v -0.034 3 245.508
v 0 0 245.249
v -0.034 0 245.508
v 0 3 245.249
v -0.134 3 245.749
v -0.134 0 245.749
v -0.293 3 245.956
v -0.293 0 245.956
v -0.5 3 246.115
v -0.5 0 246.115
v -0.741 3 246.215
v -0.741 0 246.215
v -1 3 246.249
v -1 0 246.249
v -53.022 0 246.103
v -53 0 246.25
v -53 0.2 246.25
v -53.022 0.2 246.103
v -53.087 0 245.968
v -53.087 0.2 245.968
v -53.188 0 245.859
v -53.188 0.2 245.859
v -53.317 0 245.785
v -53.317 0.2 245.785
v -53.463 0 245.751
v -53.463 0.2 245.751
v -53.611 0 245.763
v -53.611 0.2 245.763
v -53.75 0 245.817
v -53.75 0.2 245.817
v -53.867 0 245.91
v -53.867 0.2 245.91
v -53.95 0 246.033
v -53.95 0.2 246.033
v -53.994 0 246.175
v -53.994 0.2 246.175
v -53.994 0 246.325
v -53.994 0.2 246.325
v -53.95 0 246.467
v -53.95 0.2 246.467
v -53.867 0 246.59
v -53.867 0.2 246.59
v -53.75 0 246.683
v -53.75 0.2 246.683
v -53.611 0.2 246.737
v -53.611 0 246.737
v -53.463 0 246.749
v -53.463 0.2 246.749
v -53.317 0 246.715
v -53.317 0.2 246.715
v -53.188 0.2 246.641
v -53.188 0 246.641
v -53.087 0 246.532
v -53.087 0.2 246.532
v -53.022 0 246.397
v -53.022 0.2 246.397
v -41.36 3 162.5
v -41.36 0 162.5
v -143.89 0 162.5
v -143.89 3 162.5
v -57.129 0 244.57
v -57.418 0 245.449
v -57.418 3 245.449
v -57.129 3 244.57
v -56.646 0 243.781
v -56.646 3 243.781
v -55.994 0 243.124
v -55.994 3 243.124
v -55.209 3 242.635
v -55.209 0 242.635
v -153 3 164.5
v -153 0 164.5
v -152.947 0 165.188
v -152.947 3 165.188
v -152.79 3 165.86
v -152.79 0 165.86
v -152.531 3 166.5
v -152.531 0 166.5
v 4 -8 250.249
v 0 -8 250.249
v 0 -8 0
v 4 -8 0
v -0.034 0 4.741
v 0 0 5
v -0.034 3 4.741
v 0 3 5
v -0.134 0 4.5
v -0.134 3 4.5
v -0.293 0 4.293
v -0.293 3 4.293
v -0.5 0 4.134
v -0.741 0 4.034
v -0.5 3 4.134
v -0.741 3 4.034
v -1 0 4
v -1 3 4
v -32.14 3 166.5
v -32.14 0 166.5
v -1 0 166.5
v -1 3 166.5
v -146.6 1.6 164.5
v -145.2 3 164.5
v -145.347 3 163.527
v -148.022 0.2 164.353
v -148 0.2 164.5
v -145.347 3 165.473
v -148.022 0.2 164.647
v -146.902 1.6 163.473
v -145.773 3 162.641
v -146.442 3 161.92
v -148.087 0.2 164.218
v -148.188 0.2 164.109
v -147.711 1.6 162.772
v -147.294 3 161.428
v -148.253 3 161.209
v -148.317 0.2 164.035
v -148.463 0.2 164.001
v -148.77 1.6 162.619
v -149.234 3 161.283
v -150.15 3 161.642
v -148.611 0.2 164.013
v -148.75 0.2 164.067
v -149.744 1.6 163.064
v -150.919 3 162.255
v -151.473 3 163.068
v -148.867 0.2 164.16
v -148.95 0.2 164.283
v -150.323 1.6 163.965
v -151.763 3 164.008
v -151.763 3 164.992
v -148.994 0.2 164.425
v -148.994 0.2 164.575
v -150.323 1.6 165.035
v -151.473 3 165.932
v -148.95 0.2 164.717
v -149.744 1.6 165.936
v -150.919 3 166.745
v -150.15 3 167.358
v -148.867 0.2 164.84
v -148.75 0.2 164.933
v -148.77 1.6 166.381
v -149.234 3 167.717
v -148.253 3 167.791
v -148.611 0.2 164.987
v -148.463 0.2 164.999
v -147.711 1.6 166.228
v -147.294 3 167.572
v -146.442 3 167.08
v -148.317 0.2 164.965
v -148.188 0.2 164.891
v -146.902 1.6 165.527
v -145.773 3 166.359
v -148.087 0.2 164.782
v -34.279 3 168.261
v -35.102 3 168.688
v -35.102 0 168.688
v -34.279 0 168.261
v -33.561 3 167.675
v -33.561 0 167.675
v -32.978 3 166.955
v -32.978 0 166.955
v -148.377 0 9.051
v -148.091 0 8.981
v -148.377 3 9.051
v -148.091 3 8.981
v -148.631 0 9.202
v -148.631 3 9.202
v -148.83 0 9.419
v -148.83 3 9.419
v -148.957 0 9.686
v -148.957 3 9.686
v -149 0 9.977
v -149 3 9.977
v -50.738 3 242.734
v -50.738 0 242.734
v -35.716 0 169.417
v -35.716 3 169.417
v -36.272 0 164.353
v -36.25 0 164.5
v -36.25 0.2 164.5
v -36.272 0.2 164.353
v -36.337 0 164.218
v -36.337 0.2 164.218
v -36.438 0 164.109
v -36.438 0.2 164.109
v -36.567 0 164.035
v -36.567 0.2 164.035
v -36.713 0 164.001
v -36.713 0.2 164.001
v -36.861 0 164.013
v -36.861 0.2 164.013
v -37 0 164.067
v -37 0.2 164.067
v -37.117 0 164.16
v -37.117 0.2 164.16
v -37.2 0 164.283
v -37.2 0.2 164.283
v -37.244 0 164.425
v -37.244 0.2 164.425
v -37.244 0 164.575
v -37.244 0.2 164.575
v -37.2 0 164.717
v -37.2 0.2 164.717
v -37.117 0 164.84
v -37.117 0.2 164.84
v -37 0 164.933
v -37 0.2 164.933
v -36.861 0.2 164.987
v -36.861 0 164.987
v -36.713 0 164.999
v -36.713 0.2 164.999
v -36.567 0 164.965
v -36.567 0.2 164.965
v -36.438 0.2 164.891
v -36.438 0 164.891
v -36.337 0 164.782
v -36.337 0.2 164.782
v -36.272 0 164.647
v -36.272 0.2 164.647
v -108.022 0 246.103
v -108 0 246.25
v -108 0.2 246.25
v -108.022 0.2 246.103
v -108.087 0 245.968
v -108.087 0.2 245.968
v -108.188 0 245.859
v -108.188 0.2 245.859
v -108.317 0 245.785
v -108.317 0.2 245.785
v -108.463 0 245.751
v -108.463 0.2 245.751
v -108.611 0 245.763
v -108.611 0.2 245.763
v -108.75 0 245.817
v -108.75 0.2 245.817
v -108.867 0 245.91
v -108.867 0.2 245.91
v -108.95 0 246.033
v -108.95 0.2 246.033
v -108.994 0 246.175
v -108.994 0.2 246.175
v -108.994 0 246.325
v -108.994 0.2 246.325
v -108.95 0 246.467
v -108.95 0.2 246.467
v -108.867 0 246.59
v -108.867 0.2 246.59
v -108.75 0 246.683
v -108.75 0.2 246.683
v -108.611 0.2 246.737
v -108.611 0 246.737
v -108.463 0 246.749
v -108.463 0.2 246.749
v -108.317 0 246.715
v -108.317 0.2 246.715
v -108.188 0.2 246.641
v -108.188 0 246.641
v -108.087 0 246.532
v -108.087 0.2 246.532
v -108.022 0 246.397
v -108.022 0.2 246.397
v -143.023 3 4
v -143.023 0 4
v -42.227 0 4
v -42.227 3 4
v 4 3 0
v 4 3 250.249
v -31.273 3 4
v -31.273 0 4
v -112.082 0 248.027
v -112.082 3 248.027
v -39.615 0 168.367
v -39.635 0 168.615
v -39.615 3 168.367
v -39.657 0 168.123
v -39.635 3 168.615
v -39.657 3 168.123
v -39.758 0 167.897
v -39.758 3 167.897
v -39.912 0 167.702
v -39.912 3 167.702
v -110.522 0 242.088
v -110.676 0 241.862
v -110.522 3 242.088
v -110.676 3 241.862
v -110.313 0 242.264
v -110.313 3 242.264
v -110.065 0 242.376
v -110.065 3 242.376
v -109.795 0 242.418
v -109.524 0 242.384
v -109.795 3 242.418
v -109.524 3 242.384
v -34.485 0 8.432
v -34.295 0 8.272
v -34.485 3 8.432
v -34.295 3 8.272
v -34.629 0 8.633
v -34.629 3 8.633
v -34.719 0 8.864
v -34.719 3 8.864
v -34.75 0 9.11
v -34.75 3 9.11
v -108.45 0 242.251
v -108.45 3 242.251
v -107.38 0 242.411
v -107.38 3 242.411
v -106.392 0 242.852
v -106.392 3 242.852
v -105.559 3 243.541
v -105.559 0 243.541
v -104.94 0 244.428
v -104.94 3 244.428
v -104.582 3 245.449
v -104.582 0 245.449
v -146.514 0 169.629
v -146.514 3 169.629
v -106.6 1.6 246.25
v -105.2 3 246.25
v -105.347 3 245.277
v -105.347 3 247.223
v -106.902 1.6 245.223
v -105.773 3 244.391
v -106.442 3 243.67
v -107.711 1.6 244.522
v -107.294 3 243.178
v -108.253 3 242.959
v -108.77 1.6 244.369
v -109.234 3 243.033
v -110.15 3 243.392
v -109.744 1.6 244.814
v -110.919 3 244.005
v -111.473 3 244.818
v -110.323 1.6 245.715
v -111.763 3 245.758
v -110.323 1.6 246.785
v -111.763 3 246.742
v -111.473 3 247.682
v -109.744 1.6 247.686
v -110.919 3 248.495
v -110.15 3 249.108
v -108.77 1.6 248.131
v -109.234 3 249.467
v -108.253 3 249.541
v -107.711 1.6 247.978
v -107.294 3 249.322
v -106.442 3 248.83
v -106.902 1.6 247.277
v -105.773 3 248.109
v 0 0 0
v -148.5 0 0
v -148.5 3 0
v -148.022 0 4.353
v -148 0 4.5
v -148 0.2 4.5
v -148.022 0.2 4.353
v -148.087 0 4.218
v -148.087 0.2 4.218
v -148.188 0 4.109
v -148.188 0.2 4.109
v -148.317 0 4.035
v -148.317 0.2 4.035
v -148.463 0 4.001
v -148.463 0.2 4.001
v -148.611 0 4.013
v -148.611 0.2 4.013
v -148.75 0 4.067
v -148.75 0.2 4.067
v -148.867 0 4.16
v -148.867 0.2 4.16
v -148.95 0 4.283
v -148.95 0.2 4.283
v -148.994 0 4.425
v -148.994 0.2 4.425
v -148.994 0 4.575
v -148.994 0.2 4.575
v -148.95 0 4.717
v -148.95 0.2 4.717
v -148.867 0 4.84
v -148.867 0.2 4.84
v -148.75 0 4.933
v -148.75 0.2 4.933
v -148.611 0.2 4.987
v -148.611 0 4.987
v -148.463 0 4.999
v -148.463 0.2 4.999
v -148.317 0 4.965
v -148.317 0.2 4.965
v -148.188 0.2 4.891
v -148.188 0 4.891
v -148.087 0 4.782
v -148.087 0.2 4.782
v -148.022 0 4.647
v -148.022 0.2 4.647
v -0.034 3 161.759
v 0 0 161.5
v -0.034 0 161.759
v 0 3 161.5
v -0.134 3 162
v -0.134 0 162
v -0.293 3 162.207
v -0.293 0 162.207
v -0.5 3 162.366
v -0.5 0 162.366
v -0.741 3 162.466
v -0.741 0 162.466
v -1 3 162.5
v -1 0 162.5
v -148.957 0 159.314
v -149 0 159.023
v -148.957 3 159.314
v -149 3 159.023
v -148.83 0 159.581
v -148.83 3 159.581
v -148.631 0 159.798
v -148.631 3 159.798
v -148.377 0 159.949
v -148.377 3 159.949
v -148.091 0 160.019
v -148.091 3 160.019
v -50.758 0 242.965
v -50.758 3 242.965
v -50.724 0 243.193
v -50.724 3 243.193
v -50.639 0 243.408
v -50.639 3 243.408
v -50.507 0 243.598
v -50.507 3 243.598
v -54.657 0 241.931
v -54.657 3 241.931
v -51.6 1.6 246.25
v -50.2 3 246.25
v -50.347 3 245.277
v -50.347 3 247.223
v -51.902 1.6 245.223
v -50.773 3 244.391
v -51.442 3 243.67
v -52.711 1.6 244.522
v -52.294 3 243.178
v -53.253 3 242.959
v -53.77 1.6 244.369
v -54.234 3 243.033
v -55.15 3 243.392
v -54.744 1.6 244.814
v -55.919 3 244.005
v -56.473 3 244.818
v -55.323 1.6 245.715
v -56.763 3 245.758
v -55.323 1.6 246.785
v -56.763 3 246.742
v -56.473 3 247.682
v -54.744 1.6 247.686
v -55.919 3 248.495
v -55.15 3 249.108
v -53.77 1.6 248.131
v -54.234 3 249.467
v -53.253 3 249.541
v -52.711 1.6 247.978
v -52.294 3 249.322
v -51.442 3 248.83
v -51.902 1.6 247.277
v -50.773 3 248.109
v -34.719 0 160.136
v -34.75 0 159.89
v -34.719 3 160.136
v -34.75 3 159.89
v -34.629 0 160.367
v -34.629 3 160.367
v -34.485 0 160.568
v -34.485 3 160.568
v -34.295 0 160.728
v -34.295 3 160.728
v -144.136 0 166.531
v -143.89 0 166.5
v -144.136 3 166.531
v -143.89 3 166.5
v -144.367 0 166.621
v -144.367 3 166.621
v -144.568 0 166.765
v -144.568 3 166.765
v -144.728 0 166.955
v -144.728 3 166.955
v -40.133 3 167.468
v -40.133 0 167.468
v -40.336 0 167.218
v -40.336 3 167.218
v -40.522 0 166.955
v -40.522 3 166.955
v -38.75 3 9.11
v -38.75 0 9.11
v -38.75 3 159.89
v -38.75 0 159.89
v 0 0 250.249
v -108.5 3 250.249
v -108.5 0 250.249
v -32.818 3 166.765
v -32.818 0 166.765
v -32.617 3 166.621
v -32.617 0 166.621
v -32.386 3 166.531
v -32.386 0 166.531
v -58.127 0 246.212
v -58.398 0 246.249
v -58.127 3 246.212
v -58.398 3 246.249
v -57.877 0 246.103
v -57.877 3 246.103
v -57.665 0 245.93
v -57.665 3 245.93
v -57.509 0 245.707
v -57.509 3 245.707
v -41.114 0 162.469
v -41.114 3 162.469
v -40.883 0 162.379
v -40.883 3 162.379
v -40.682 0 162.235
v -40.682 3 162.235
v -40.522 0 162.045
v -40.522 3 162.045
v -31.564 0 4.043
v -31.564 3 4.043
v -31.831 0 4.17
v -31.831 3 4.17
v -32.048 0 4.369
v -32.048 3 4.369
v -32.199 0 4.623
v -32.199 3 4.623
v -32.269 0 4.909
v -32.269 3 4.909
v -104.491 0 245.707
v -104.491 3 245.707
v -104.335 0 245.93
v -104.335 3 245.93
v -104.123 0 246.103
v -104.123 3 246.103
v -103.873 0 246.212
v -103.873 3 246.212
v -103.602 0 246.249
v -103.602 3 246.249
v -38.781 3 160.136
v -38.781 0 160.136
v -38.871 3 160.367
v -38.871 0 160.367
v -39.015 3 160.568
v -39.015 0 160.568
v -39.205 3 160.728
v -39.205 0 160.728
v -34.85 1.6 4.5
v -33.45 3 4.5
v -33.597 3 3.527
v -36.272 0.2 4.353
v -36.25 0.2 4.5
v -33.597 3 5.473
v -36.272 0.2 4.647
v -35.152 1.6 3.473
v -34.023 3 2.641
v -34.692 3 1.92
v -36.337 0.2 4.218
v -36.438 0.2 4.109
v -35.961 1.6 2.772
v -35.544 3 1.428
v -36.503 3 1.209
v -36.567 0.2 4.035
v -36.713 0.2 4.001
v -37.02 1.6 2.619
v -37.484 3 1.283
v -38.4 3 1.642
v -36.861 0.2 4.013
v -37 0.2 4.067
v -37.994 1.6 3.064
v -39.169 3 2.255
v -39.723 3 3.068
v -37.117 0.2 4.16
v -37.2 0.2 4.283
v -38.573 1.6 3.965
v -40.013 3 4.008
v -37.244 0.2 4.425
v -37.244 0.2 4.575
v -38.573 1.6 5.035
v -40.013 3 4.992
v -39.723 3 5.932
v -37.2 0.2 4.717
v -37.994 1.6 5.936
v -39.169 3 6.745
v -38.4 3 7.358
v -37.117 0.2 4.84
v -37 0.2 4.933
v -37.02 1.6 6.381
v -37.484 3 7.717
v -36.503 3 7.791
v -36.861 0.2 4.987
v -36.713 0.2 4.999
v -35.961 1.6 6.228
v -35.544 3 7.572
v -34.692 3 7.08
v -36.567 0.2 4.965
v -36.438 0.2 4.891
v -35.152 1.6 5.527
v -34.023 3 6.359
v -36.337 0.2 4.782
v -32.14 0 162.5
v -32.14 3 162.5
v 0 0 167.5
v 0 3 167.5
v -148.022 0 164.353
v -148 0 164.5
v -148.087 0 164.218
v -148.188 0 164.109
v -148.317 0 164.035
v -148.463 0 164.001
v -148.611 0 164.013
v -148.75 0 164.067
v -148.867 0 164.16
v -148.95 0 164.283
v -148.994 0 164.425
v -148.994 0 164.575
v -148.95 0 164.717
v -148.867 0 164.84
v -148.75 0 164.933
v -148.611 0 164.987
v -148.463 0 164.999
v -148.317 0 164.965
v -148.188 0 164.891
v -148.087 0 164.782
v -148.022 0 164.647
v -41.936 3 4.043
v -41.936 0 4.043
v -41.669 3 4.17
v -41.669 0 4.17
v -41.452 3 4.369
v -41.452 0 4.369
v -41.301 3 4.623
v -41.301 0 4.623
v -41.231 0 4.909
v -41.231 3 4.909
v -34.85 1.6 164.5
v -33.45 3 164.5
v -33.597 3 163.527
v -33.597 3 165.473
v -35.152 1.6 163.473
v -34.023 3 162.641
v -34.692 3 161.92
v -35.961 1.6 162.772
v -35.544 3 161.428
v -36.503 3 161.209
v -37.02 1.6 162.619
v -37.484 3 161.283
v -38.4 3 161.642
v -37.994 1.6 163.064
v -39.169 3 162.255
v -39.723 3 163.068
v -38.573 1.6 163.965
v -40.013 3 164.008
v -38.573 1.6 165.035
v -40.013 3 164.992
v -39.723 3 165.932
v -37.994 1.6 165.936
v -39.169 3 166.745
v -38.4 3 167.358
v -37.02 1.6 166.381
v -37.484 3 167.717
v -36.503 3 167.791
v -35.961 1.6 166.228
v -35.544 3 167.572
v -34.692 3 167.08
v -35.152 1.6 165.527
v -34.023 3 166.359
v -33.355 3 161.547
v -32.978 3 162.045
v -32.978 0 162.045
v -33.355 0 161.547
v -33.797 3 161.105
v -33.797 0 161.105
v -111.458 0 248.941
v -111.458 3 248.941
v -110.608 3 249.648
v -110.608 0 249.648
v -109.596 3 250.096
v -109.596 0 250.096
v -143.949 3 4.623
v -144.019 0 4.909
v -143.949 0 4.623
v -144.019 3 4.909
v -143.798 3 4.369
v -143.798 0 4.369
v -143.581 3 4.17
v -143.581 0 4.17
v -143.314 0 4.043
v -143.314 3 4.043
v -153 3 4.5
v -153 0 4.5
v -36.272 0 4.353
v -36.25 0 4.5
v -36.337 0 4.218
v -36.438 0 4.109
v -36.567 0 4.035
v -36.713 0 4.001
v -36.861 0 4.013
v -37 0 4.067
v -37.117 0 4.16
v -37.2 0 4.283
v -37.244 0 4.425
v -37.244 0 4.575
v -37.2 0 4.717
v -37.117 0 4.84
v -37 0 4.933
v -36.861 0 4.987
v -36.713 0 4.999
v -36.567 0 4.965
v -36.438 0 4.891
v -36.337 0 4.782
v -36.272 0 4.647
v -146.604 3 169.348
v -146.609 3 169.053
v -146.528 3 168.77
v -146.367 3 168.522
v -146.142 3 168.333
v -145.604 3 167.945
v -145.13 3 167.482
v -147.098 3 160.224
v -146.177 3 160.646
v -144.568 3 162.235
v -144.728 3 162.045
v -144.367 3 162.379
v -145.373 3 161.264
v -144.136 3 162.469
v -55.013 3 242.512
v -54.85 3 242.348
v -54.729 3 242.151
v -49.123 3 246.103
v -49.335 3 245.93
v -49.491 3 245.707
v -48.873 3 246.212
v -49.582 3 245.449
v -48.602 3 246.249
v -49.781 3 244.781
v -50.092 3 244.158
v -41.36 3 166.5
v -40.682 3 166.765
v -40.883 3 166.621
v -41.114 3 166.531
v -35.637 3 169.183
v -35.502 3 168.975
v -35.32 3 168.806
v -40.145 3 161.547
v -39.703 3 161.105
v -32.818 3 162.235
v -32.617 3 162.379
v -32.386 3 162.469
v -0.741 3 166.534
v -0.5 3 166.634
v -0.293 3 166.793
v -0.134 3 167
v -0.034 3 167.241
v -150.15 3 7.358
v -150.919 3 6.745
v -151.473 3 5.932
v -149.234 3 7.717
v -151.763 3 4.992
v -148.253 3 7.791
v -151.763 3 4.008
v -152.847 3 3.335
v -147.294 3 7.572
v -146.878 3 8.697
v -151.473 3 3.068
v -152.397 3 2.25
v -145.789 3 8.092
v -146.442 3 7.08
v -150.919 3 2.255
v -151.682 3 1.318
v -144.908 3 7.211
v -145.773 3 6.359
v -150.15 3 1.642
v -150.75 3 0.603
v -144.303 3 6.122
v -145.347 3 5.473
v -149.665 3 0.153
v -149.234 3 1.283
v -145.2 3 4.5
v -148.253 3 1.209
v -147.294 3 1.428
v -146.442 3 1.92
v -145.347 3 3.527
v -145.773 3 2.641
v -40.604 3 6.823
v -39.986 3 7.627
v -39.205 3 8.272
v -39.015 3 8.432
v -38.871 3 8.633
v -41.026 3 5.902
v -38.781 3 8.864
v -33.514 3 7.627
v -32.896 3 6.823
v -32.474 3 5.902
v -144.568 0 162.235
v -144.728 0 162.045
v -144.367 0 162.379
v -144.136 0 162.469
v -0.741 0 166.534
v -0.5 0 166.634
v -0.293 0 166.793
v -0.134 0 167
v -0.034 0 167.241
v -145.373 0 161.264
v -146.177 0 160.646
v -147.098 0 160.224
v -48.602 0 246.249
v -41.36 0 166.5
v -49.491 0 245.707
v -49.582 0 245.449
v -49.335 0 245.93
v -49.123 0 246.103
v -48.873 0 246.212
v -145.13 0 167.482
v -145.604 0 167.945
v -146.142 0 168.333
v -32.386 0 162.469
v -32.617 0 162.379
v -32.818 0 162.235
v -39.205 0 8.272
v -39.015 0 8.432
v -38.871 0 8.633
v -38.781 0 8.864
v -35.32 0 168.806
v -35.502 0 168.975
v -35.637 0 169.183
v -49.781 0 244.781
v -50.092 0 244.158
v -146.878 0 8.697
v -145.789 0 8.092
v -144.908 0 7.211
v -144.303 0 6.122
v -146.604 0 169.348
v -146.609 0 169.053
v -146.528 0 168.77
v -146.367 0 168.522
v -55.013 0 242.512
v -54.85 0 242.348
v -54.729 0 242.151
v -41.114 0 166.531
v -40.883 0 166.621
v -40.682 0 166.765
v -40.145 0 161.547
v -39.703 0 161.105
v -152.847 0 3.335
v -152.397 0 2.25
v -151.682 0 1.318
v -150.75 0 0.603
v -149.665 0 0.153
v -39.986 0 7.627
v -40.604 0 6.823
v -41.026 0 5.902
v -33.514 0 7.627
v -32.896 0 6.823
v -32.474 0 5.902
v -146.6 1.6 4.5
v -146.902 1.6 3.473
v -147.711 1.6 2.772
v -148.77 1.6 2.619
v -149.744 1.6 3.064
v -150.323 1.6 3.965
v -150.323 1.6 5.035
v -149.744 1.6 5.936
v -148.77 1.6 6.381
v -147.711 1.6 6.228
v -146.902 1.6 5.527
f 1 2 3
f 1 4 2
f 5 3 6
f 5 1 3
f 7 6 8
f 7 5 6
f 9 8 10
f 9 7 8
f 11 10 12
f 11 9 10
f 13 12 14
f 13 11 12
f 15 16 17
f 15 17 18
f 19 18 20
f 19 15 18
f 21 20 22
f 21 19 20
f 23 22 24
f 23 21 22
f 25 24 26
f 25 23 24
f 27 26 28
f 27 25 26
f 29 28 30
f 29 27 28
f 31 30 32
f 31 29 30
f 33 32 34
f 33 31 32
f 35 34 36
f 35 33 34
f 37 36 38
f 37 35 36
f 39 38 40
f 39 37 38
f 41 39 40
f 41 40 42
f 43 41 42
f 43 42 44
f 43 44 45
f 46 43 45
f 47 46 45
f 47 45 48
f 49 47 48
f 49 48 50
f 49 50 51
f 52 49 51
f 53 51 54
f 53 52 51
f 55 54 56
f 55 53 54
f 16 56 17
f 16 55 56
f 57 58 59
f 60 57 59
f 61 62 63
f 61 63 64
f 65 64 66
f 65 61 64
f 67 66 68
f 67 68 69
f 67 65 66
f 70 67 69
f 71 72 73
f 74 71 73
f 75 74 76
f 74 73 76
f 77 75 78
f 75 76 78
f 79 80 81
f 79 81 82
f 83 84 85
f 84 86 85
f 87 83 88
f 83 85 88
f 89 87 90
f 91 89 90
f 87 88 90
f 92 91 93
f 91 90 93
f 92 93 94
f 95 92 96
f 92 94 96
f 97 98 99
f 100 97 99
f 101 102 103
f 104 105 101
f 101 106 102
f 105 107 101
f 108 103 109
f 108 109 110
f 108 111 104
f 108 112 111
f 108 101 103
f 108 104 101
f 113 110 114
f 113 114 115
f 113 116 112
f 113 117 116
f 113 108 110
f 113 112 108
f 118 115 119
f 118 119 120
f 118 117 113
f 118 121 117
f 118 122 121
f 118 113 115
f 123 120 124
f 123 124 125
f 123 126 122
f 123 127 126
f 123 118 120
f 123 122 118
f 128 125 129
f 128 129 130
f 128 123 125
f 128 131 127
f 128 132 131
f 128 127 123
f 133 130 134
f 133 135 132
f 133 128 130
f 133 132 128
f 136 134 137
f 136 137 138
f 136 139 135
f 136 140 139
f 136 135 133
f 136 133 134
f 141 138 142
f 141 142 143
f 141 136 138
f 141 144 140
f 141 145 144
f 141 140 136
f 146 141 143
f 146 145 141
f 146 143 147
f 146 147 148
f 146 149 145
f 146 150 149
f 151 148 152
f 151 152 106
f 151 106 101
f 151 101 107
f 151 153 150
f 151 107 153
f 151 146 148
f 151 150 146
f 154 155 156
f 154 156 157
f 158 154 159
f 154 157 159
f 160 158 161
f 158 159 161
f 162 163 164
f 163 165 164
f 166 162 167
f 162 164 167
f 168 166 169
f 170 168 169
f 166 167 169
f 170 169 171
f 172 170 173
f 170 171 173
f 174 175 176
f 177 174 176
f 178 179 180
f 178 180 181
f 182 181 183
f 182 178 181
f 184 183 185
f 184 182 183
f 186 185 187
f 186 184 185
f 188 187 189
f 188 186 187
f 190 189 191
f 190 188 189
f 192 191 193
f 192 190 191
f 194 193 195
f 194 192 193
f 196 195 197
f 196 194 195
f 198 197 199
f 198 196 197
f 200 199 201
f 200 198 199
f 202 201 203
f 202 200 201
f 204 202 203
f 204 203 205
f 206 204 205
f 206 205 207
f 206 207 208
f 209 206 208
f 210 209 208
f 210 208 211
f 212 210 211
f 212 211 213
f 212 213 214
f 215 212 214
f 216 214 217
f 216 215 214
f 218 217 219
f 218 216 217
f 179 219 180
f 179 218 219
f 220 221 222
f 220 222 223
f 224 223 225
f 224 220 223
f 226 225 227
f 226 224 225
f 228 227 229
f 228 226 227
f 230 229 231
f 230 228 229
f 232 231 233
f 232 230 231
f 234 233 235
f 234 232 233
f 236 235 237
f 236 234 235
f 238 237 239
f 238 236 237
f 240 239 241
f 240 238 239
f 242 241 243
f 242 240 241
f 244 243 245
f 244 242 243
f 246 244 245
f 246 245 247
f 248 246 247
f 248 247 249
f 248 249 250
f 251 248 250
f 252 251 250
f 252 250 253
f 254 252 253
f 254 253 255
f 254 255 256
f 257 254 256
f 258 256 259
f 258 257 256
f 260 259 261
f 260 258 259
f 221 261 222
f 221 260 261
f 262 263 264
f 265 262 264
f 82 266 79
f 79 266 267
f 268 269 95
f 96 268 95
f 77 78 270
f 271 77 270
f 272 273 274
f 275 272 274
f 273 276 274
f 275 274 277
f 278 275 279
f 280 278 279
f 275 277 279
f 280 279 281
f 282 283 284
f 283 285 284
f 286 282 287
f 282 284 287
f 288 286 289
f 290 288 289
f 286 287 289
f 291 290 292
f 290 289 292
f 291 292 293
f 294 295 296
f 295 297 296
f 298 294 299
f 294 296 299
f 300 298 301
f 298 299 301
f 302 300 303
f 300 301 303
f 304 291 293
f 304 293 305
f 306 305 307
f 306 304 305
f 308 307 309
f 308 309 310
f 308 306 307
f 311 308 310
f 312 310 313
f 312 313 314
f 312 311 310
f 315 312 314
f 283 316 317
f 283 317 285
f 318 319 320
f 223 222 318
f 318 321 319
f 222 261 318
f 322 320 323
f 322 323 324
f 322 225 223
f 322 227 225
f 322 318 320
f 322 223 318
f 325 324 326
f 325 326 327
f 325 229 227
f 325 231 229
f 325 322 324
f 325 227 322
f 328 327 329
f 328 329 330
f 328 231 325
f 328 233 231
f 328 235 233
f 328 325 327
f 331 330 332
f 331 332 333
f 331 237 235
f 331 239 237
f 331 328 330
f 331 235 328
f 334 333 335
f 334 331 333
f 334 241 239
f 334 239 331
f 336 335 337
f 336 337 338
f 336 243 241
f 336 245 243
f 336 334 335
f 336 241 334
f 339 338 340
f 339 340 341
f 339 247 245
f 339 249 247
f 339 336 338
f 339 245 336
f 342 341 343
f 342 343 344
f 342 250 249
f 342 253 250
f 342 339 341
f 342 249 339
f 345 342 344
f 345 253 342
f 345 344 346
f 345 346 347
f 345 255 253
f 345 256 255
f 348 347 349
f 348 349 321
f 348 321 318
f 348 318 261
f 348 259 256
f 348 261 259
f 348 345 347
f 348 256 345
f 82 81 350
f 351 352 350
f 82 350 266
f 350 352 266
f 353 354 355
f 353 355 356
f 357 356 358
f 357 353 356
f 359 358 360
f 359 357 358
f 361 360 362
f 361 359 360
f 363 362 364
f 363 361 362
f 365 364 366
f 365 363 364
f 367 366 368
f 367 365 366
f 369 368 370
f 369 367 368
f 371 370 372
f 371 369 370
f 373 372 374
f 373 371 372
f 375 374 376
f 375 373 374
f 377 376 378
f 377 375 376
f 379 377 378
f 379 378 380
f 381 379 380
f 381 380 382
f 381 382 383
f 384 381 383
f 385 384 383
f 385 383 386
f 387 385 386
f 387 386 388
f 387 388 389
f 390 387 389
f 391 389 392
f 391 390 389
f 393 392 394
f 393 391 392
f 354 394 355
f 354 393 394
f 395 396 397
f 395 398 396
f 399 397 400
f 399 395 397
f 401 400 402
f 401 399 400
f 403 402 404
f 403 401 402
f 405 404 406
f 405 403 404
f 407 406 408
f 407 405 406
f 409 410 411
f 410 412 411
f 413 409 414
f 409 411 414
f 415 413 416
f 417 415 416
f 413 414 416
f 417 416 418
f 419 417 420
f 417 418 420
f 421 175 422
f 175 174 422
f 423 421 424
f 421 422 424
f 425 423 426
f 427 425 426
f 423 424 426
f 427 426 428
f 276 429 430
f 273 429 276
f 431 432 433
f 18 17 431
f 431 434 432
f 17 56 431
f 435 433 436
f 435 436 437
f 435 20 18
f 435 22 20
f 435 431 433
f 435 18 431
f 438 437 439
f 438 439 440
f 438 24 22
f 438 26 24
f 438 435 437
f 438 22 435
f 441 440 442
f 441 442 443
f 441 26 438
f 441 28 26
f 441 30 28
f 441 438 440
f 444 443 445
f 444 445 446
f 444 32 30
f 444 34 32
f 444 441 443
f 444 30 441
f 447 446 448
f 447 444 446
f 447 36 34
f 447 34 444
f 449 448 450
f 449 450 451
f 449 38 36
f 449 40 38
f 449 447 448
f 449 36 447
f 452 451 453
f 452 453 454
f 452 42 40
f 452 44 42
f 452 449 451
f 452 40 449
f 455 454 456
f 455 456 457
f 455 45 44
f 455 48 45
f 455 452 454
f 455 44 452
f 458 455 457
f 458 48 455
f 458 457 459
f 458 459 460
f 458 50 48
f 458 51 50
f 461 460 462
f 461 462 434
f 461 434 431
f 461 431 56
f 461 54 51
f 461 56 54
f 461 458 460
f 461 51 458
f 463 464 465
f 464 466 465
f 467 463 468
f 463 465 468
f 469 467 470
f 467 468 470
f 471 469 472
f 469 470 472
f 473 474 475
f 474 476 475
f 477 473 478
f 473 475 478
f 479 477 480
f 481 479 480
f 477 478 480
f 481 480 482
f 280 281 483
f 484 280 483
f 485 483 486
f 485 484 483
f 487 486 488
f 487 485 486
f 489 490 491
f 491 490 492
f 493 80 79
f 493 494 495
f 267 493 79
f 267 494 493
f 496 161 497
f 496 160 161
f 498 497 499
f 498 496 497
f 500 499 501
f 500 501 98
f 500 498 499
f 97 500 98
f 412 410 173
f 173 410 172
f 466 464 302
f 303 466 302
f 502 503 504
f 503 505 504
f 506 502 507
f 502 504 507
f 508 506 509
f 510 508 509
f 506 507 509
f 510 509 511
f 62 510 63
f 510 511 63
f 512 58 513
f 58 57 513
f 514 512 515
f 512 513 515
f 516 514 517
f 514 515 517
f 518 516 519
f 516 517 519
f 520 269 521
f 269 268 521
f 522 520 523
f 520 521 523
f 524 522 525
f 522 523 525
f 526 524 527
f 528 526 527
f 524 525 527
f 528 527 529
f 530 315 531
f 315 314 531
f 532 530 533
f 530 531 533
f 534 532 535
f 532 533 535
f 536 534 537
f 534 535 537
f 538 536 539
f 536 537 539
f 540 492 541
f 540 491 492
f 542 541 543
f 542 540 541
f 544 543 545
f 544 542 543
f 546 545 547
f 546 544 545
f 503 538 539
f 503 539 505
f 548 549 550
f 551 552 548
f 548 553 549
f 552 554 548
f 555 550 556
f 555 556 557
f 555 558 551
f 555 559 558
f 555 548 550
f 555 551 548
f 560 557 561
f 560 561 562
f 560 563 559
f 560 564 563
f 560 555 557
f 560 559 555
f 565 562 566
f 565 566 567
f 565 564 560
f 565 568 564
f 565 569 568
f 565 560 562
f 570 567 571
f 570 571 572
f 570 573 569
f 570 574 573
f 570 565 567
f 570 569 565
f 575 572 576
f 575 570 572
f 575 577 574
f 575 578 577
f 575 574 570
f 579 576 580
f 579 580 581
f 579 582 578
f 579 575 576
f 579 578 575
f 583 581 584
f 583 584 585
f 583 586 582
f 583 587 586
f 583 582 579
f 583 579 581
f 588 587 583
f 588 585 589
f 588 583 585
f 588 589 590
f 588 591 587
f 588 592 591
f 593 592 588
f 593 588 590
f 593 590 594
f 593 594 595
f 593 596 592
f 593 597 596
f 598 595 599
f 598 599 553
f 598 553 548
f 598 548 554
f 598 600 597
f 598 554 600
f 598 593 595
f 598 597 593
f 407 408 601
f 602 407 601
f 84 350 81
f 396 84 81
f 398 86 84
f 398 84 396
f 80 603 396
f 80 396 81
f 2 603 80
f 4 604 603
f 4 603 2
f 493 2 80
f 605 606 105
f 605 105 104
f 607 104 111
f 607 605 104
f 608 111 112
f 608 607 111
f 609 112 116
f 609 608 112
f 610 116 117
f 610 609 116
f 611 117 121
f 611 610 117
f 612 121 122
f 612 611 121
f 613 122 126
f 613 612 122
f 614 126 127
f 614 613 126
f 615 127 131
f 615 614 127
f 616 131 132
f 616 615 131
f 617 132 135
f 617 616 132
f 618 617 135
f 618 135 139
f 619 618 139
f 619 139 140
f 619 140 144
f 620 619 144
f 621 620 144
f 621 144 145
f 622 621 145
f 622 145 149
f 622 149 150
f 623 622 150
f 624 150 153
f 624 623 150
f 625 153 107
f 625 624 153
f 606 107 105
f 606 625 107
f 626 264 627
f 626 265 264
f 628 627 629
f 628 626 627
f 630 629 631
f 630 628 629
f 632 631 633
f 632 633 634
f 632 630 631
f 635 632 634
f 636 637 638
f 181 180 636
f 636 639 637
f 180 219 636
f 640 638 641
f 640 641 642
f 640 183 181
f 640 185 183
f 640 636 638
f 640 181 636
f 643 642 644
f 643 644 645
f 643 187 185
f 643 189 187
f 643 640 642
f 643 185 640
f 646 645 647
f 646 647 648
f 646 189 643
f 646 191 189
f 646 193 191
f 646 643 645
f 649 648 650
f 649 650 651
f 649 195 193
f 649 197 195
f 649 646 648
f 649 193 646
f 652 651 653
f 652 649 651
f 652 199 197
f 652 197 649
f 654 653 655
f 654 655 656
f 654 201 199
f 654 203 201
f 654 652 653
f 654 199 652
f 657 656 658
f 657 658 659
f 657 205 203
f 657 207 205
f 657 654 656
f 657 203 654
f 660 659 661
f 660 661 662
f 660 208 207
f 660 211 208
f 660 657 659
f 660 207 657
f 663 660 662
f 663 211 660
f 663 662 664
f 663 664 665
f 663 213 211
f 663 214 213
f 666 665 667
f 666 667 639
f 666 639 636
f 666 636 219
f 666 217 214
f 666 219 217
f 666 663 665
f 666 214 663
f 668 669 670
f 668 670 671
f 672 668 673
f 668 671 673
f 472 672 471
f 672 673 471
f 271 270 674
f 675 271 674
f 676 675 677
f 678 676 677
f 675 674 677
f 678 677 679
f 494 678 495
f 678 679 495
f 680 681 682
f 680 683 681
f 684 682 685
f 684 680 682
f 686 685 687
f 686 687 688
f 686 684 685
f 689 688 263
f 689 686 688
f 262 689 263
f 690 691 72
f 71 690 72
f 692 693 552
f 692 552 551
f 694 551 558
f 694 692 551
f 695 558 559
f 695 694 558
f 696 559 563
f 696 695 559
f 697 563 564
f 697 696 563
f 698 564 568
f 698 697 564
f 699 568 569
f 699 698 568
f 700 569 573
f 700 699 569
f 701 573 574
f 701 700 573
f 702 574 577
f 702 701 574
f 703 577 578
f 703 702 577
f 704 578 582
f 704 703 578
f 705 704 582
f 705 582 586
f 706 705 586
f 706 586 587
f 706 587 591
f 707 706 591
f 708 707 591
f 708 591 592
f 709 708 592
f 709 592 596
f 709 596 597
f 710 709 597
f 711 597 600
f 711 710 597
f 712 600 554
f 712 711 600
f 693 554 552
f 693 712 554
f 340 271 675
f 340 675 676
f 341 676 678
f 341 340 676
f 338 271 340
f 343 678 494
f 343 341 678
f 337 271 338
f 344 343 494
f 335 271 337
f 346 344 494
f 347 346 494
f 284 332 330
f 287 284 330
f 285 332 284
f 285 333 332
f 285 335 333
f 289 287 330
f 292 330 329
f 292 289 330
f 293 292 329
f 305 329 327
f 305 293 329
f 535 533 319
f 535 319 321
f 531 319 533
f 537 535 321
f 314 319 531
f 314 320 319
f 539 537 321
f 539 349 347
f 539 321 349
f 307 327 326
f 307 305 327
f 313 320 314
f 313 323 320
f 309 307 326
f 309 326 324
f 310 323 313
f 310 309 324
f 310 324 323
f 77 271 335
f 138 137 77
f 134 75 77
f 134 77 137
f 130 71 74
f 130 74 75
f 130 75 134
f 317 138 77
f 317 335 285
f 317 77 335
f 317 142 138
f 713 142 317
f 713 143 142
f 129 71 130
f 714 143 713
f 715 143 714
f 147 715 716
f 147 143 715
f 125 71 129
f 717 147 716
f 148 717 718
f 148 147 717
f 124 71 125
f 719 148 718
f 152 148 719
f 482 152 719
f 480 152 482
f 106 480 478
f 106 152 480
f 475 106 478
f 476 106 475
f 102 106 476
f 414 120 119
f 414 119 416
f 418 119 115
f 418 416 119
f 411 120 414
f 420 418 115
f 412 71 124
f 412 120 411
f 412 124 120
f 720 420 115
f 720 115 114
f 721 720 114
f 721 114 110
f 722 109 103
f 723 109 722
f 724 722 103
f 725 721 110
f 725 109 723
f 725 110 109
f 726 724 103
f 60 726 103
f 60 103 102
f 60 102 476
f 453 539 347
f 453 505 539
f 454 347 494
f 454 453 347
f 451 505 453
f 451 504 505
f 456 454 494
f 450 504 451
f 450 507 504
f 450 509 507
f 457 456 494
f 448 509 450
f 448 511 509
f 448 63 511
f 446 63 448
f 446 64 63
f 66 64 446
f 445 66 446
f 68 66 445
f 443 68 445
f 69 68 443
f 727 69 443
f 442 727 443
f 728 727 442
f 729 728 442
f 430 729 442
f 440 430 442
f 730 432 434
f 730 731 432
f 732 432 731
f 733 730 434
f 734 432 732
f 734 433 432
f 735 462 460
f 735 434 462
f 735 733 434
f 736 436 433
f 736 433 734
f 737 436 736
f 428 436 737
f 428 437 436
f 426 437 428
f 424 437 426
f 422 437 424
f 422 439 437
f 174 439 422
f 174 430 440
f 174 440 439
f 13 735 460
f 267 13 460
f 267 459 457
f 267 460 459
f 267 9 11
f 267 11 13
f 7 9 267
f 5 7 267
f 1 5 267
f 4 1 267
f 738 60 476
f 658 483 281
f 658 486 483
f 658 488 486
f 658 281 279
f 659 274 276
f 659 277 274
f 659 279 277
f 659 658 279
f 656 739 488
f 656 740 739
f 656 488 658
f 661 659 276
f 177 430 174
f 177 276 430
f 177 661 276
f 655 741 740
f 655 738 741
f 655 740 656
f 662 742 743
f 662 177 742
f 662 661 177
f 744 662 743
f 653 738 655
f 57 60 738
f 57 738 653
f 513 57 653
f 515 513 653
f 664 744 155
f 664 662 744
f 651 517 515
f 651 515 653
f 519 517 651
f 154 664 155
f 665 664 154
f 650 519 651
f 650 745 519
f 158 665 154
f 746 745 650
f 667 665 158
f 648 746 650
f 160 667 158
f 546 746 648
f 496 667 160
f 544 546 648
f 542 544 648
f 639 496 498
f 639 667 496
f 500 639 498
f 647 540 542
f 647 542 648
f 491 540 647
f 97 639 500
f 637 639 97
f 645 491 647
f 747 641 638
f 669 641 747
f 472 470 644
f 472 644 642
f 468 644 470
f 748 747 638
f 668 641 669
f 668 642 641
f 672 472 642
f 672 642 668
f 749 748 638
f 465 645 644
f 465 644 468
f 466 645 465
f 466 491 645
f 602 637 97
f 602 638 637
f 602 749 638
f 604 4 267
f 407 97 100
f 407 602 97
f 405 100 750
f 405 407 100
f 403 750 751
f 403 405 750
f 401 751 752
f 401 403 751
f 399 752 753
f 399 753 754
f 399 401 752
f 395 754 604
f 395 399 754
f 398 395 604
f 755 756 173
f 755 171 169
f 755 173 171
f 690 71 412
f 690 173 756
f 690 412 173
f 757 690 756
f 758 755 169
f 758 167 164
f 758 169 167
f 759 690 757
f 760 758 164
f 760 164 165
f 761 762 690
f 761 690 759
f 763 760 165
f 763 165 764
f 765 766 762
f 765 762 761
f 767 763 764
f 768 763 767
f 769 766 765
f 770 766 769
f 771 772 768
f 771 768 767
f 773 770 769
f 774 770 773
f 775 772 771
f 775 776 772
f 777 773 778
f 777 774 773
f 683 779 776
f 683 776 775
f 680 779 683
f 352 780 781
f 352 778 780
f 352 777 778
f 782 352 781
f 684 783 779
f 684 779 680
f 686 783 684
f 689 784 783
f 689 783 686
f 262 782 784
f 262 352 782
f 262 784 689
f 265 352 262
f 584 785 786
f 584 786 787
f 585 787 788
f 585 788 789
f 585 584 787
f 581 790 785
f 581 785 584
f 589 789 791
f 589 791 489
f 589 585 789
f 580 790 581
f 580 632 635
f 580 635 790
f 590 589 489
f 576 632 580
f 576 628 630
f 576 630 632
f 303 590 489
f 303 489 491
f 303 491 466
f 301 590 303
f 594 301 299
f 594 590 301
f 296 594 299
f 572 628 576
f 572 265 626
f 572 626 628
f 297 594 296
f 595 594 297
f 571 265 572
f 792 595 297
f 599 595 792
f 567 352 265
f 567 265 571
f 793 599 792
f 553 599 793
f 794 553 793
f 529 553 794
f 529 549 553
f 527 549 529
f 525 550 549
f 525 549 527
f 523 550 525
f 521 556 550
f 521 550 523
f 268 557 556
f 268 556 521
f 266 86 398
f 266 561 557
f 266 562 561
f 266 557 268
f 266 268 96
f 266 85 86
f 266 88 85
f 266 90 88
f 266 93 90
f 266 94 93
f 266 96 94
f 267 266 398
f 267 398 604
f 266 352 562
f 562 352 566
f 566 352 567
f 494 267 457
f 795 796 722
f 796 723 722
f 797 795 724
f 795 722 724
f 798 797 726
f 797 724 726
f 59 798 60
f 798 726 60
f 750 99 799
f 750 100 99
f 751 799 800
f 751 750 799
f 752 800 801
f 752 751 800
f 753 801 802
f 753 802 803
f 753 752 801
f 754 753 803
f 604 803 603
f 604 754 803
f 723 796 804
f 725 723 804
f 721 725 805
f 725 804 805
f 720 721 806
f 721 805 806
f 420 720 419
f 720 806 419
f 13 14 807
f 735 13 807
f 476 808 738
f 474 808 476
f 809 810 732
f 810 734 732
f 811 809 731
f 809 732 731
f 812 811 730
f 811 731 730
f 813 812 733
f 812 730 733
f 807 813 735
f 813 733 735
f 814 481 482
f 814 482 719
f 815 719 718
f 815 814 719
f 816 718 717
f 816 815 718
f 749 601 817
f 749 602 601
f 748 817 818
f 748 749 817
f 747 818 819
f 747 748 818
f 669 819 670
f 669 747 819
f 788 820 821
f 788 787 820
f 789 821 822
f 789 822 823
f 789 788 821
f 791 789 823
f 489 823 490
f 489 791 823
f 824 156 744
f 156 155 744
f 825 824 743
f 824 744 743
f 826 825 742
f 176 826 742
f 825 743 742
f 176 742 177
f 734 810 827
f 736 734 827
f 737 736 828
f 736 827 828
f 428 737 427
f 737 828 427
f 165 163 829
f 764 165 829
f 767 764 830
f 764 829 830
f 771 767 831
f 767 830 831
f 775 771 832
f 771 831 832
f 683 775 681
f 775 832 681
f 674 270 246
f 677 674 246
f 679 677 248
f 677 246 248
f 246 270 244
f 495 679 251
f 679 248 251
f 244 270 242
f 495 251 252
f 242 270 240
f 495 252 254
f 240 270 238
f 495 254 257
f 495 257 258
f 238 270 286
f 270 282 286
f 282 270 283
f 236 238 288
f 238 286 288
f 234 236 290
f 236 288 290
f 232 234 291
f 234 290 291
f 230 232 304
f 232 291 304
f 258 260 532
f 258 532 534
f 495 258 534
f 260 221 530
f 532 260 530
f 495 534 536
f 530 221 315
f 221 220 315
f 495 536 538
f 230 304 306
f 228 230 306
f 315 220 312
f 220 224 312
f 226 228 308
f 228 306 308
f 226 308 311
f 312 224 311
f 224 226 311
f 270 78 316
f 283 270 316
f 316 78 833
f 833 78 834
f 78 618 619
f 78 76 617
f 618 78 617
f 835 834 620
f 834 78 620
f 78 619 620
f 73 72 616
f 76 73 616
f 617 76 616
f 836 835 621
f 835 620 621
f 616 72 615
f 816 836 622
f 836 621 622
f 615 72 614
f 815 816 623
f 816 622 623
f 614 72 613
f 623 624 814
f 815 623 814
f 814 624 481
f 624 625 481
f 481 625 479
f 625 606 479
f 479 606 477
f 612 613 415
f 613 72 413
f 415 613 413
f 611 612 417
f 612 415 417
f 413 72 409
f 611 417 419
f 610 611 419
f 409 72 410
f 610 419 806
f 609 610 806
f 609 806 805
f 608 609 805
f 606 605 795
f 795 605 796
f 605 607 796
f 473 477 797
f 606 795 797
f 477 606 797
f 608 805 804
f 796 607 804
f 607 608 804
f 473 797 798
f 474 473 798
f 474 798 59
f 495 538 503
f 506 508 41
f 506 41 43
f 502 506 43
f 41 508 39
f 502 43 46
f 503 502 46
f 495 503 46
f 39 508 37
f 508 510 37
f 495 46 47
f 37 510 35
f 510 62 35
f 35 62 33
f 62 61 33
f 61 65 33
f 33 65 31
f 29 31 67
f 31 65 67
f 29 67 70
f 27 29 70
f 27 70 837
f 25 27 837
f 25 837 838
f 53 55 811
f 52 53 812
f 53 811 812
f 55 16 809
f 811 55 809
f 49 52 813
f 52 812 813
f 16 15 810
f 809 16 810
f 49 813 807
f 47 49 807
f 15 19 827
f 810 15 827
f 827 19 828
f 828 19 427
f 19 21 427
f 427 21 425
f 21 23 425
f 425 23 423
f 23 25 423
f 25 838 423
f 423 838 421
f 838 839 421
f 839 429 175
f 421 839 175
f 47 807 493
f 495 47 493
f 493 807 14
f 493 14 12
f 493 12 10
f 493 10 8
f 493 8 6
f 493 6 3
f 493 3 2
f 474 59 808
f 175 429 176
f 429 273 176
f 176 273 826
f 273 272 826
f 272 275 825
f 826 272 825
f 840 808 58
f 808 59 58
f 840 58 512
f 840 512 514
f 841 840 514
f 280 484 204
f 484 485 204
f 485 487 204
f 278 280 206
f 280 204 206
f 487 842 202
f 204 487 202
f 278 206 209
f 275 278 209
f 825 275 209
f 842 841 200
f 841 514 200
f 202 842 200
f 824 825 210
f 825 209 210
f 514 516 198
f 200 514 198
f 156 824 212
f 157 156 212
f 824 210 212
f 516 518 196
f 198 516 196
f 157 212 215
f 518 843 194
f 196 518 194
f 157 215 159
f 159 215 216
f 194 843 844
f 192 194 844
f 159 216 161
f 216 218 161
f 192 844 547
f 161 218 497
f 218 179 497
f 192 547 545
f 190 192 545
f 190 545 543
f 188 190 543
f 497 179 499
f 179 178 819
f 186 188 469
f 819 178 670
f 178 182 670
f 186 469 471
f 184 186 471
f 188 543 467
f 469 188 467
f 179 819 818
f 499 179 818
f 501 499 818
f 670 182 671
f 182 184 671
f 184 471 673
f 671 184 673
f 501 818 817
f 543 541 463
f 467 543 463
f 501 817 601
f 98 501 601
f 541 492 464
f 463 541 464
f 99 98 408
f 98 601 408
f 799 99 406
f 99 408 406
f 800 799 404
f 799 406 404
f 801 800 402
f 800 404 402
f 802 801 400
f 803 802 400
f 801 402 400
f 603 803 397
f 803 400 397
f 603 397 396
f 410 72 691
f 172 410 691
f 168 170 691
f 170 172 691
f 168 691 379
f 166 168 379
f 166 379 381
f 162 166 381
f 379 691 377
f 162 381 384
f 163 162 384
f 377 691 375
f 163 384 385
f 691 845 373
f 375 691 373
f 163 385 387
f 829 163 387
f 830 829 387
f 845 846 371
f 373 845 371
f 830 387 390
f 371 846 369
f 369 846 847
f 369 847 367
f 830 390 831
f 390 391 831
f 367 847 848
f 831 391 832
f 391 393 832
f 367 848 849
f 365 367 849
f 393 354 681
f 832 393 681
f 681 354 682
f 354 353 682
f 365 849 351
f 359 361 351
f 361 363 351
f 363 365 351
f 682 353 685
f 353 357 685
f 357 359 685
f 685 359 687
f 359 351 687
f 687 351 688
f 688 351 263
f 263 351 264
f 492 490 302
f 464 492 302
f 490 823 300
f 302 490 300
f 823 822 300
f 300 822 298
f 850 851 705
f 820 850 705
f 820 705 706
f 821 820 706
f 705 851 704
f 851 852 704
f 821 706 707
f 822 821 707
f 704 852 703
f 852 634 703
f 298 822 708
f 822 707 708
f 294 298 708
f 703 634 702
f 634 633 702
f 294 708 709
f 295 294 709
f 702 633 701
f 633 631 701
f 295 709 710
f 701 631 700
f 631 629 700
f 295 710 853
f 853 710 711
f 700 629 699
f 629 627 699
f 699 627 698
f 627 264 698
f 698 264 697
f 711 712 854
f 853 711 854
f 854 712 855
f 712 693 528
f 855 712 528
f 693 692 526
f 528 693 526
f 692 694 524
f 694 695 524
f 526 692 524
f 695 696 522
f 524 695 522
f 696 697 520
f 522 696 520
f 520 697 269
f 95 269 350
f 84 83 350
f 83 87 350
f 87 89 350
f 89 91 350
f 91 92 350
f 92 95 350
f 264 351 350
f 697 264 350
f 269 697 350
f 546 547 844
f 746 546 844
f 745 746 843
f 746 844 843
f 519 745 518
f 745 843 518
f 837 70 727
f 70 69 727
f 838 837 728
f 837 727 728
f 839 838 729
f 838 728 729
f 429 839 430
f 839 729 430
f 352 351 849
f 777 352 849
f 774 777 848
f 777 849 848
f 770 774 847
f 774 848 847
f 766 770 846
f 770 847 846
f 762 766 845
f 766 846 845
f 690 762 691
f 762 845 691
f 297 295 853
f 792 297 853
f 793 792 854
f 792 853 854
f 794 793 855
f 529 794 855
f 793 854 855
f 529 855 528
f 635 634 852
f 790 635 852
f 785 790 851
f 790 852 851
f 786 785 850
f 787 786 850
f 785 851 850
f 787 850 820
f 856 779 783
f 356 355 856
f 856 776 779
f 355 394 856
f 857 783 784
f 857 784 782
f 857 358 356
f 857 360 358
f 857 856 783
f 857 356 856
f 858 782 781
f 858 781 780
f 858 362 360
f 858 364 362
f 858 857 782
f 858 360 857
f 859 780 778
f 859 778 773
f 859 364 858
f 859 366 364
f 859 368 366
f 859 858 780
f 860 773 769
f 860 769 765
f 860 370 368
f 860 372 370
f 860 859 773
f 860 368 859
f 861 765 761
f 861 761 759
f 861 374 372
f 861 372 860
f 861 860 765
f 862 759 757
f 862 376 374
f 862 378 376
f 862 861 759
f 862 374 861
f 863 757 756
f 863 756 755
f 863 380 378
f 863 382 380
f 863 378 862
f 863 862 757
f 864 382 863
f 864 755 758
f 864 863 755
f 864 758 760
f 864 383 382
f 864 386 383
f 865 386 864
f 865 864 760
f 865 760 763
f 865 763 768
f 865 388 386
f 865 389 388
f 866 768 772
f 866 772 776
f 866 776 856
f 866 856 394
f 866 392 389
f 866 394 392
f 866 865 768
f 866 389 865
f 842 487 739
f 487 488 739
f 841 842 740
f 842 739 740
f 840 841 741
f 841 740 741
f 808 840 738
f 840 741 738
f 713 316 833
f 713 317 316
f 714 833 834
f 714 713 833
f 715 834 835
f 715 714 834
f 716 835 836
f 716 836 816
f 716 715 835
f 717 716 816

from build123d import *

# Parameters (mm, degrees)
SKETCH2_R           = 0.5
BOSS_EXTRUDE1_DEPTH = 3
SKETCH3_W           = 4
SKETCH3_H           = 250.248923326
BOSS_EXTRUDE2_DEPTH = 8
CHAMFER1_SIZE       = 2.8
FILLET1_R           = 1


with BuildPart() as part:
    # Sketch2 → Boss-Extrude1 (new body)
    with BuildSketch(Plane(origin=(0, 0, 0), x_dir=(1, 0, 0), z_dir=(0, 1, 0))):
        with BuildLine():
            Line((4, -250.248923326), (4, 0))
            Line((4, 0), (0, 0))
            Line((0, 0), (-148.5, 0))
            ThreePointArc((-148.5, 0), (-151.681980515, -1.318019485), (-153, -4.5))
            Line((-153, -4.5), (-153, -164.5))
            ThreePointArc((-153, -164.5), (-152.88121444, -165.527112473), (-152.531128874, -166.5))
            Line((-152.531128874, -166.5), (-112.082261174, -248.027299256))
            ThreePointArc((-112.082261174, -248.027299256), (-110.60761765, -249.648431345), (-108.5, -250.248923326))
            Line((-108.5, -250.248923326), (4, -250.248923326))
        make_face()
        with Locations((-148.5, -4.5)):
            Circle(SKETCH2_R, mode=Mode.SUBTRACT)
        with Locations((-36.75, -4.5)):
            Circle(SKETCH2_R, mode=Mode.SUBTRACT)
        with Locations((-36.75, -164.5)):
            Circle(SKETCH2_R, mode=Mode.SUBTRACT)
        with Locations((-148.5, -164.5)):
            Circle(SKETCH2_R, mode=Mode.SUBTRACT)
        with Locations((-108.5, -246.25)):
            Circle(SKETCH2_R, mode=Mode.SUBTRACT)
        with Locations((-53.5, -246.25)):
            Circle(SKETCH2_R, mode=Mode.SUBTRACT)
        with BuildLine():
            Line((0, -4), (0, -162.5))
            Line((0, -162.5), (-32.718871126, -162.5))
            ThreePointArc((-32.718871126, -162.5), (-33.568019485, -161.318019485), (-34.75, -160.468871126))
            Line((-34.75, -160.468871126), (-34.75, -8.531128874))
            ThreePointArc((-34.75, -8.531128874), (-32.799693914, -6.655245189), (-32.277864045, -4))
            Line((-32.277864045, -4), (0, -4))
        make_face(mode=Mode.SUBTRACT)
        with BuildLine():
            Line((-144.027864045, -4), (-41.222135955, -4))
            ThreePointArc((-41.222135955, -4), (-40.700306086, -6.655245189), (-38.75, -8.531128874))
            Line((-38.75, -8.531128874), (-38.75, -160.468871126))
            ThreePointArc((-38.75, -160.468871126), (-39.931980515, -161.318019485), (-40.781128874, -162.5))
            Line((-40.781128874, -162.5), (-144.468871126, -162.5))
            ThreePointArc((-144.468871126, -162.5), (-146.344754811, -160.549693914), (-149, -160.027864045))
            Line((-149, -160.027864045), (-149, -8.972135955))
            ThreePointArc((-149, -8.972135955), (-145.318019485, -7.681980515), (-144.027864045, -4))
        make_face(mode=Mode.SUBTRACT)
        with BuildLine():
            Line((-32.718871126, -166.5), (0, -166.5))
            Line((0, -166.5), (0, -246.248923326))
            Line((0, -246.248923326), (-49.501076819, -246.248923326))
            ThreePointArc((-49.501076819, -246.248923326), (-49.852891921, -244.609880972), (-50.845628636, -243.25906362))
            Line((-50.845628636, -243.25906362), (-35.599844174, -168.850533482))
            ThreePointArc((-35.599844174, -168.850533482), (-33.905236442, -167.986734905), (-32.718871126, -166.5))
        make_face(mode=Mode.SUBTRACT)
        with BuildLine():
            Line((-146.960287228, -168.728390306), (-110.2763347, -242.667260434))
            ThreePointArc((-110.2763347, -242.667260434), (-106.39238235, -242.851568655), (-104.501076819, -246.248923326))
            Line((-104.501076819, -246.248923326), (-57.498923181, -246.248923326))
            ThreePointArc((-57.498923181, -246.248923326), (-56.743672678, -243.911202162), (-54.764220792, -242.456171649))
            Line((-54.764220792, -242.456171649), (-39.518436329, -168.047641511))
            ThreePointArc((-39.518436329, -168.047641511), (-40.236734905, -167.344763558), (-40.781128874, -166.5))
            Line((-40.781128874, -166.5), (-144.468871126, -166.5))
            ThreePointArc((-144.468871126, -166.5), (-145.5, -167.854101966), (-146.960287228, -168.728390306))
        make_face(mode=Mode.SUBTRACT)
    extrude(amount=BOSS_EXTRUDE1_DEPTH)

    # Sketch3 → Boss-Extrude2 (add)
    with BuildSketch(Plane.XZ):
        with Locations((2, 125.124461663)):
            Rectangle(SKETCH3_W, SKETCH3_H)
    extrude(amount=BOSS_EXTRUDE2_DEPTH)

    # Chamfer1
    chamfer1_edges = [part.edges().sort_by_distance(p)[0] for p in [
        (-109, 3, 246.25),
        (-54, 3, 246.25),
        (-149, 3, 4.5),
        (-37.25, 3, 4.5),
        (-37.25, 3, 164.5),
        (-149, 3, 164.5),
    ]]
    chamfer(chamfer1_edges, length=CHAMFER1_SIZE)

    # Fillet1
    fillet1_edges = [part.edges().sort_by_distance(p)[0] for p in [
        (-32.718871126, 1.5, 166.5),
        (-35.599844174, 1.5, 168.850533482),
        (-50.845628636, 1.5, 243.25906362),
        (-49.501076819, 1.5, 246.248923326),
        (0, 1.5, 246.248923326),
        (0, 1.5, 166.5),
        (-32.277864045, 1.5, 4),
        (-34.75, 1.5, 8.531128874),
        (-34.75, 1.5, 160.468871126),
        (-32.718871126, 1.5, 162.5),
        (0, 1.5, 162.5),
        (0, 1.5, 4),
        (-144.027864045, 1.5, 4),
        (-149, 1.5, 8.972135955),
        (-149, 1.5, 160.027864045),
        (-144.468871126, 1.5, 162.5),
        (-40.781128874, 1.5, 162.5),
        (-38.75, 1.5, 160.468871126),
        (-38.75, 1.5, 8.531128874),
        (-41.222135955, 1.5, 4),
        (-57.498923181, 1.5, 246.248923326),
        (-54.764220792, 1.5, 242.456171649),
        (-39.518436329, 1.5, 168.047641511),
        (-40.781128874, 1.5, 166.5),
        (-144.468871126, 1.5, 166.5),
        (-146.960287228, 1.5, 168.728390306),
        (-110.2763347, 1.5, 242.667260434),
        (-104.501076819, 1.5, 246.248923326),
    ]]
    fillet(fillet1_edges, radius=FILLET1_R)


solid = part.part
